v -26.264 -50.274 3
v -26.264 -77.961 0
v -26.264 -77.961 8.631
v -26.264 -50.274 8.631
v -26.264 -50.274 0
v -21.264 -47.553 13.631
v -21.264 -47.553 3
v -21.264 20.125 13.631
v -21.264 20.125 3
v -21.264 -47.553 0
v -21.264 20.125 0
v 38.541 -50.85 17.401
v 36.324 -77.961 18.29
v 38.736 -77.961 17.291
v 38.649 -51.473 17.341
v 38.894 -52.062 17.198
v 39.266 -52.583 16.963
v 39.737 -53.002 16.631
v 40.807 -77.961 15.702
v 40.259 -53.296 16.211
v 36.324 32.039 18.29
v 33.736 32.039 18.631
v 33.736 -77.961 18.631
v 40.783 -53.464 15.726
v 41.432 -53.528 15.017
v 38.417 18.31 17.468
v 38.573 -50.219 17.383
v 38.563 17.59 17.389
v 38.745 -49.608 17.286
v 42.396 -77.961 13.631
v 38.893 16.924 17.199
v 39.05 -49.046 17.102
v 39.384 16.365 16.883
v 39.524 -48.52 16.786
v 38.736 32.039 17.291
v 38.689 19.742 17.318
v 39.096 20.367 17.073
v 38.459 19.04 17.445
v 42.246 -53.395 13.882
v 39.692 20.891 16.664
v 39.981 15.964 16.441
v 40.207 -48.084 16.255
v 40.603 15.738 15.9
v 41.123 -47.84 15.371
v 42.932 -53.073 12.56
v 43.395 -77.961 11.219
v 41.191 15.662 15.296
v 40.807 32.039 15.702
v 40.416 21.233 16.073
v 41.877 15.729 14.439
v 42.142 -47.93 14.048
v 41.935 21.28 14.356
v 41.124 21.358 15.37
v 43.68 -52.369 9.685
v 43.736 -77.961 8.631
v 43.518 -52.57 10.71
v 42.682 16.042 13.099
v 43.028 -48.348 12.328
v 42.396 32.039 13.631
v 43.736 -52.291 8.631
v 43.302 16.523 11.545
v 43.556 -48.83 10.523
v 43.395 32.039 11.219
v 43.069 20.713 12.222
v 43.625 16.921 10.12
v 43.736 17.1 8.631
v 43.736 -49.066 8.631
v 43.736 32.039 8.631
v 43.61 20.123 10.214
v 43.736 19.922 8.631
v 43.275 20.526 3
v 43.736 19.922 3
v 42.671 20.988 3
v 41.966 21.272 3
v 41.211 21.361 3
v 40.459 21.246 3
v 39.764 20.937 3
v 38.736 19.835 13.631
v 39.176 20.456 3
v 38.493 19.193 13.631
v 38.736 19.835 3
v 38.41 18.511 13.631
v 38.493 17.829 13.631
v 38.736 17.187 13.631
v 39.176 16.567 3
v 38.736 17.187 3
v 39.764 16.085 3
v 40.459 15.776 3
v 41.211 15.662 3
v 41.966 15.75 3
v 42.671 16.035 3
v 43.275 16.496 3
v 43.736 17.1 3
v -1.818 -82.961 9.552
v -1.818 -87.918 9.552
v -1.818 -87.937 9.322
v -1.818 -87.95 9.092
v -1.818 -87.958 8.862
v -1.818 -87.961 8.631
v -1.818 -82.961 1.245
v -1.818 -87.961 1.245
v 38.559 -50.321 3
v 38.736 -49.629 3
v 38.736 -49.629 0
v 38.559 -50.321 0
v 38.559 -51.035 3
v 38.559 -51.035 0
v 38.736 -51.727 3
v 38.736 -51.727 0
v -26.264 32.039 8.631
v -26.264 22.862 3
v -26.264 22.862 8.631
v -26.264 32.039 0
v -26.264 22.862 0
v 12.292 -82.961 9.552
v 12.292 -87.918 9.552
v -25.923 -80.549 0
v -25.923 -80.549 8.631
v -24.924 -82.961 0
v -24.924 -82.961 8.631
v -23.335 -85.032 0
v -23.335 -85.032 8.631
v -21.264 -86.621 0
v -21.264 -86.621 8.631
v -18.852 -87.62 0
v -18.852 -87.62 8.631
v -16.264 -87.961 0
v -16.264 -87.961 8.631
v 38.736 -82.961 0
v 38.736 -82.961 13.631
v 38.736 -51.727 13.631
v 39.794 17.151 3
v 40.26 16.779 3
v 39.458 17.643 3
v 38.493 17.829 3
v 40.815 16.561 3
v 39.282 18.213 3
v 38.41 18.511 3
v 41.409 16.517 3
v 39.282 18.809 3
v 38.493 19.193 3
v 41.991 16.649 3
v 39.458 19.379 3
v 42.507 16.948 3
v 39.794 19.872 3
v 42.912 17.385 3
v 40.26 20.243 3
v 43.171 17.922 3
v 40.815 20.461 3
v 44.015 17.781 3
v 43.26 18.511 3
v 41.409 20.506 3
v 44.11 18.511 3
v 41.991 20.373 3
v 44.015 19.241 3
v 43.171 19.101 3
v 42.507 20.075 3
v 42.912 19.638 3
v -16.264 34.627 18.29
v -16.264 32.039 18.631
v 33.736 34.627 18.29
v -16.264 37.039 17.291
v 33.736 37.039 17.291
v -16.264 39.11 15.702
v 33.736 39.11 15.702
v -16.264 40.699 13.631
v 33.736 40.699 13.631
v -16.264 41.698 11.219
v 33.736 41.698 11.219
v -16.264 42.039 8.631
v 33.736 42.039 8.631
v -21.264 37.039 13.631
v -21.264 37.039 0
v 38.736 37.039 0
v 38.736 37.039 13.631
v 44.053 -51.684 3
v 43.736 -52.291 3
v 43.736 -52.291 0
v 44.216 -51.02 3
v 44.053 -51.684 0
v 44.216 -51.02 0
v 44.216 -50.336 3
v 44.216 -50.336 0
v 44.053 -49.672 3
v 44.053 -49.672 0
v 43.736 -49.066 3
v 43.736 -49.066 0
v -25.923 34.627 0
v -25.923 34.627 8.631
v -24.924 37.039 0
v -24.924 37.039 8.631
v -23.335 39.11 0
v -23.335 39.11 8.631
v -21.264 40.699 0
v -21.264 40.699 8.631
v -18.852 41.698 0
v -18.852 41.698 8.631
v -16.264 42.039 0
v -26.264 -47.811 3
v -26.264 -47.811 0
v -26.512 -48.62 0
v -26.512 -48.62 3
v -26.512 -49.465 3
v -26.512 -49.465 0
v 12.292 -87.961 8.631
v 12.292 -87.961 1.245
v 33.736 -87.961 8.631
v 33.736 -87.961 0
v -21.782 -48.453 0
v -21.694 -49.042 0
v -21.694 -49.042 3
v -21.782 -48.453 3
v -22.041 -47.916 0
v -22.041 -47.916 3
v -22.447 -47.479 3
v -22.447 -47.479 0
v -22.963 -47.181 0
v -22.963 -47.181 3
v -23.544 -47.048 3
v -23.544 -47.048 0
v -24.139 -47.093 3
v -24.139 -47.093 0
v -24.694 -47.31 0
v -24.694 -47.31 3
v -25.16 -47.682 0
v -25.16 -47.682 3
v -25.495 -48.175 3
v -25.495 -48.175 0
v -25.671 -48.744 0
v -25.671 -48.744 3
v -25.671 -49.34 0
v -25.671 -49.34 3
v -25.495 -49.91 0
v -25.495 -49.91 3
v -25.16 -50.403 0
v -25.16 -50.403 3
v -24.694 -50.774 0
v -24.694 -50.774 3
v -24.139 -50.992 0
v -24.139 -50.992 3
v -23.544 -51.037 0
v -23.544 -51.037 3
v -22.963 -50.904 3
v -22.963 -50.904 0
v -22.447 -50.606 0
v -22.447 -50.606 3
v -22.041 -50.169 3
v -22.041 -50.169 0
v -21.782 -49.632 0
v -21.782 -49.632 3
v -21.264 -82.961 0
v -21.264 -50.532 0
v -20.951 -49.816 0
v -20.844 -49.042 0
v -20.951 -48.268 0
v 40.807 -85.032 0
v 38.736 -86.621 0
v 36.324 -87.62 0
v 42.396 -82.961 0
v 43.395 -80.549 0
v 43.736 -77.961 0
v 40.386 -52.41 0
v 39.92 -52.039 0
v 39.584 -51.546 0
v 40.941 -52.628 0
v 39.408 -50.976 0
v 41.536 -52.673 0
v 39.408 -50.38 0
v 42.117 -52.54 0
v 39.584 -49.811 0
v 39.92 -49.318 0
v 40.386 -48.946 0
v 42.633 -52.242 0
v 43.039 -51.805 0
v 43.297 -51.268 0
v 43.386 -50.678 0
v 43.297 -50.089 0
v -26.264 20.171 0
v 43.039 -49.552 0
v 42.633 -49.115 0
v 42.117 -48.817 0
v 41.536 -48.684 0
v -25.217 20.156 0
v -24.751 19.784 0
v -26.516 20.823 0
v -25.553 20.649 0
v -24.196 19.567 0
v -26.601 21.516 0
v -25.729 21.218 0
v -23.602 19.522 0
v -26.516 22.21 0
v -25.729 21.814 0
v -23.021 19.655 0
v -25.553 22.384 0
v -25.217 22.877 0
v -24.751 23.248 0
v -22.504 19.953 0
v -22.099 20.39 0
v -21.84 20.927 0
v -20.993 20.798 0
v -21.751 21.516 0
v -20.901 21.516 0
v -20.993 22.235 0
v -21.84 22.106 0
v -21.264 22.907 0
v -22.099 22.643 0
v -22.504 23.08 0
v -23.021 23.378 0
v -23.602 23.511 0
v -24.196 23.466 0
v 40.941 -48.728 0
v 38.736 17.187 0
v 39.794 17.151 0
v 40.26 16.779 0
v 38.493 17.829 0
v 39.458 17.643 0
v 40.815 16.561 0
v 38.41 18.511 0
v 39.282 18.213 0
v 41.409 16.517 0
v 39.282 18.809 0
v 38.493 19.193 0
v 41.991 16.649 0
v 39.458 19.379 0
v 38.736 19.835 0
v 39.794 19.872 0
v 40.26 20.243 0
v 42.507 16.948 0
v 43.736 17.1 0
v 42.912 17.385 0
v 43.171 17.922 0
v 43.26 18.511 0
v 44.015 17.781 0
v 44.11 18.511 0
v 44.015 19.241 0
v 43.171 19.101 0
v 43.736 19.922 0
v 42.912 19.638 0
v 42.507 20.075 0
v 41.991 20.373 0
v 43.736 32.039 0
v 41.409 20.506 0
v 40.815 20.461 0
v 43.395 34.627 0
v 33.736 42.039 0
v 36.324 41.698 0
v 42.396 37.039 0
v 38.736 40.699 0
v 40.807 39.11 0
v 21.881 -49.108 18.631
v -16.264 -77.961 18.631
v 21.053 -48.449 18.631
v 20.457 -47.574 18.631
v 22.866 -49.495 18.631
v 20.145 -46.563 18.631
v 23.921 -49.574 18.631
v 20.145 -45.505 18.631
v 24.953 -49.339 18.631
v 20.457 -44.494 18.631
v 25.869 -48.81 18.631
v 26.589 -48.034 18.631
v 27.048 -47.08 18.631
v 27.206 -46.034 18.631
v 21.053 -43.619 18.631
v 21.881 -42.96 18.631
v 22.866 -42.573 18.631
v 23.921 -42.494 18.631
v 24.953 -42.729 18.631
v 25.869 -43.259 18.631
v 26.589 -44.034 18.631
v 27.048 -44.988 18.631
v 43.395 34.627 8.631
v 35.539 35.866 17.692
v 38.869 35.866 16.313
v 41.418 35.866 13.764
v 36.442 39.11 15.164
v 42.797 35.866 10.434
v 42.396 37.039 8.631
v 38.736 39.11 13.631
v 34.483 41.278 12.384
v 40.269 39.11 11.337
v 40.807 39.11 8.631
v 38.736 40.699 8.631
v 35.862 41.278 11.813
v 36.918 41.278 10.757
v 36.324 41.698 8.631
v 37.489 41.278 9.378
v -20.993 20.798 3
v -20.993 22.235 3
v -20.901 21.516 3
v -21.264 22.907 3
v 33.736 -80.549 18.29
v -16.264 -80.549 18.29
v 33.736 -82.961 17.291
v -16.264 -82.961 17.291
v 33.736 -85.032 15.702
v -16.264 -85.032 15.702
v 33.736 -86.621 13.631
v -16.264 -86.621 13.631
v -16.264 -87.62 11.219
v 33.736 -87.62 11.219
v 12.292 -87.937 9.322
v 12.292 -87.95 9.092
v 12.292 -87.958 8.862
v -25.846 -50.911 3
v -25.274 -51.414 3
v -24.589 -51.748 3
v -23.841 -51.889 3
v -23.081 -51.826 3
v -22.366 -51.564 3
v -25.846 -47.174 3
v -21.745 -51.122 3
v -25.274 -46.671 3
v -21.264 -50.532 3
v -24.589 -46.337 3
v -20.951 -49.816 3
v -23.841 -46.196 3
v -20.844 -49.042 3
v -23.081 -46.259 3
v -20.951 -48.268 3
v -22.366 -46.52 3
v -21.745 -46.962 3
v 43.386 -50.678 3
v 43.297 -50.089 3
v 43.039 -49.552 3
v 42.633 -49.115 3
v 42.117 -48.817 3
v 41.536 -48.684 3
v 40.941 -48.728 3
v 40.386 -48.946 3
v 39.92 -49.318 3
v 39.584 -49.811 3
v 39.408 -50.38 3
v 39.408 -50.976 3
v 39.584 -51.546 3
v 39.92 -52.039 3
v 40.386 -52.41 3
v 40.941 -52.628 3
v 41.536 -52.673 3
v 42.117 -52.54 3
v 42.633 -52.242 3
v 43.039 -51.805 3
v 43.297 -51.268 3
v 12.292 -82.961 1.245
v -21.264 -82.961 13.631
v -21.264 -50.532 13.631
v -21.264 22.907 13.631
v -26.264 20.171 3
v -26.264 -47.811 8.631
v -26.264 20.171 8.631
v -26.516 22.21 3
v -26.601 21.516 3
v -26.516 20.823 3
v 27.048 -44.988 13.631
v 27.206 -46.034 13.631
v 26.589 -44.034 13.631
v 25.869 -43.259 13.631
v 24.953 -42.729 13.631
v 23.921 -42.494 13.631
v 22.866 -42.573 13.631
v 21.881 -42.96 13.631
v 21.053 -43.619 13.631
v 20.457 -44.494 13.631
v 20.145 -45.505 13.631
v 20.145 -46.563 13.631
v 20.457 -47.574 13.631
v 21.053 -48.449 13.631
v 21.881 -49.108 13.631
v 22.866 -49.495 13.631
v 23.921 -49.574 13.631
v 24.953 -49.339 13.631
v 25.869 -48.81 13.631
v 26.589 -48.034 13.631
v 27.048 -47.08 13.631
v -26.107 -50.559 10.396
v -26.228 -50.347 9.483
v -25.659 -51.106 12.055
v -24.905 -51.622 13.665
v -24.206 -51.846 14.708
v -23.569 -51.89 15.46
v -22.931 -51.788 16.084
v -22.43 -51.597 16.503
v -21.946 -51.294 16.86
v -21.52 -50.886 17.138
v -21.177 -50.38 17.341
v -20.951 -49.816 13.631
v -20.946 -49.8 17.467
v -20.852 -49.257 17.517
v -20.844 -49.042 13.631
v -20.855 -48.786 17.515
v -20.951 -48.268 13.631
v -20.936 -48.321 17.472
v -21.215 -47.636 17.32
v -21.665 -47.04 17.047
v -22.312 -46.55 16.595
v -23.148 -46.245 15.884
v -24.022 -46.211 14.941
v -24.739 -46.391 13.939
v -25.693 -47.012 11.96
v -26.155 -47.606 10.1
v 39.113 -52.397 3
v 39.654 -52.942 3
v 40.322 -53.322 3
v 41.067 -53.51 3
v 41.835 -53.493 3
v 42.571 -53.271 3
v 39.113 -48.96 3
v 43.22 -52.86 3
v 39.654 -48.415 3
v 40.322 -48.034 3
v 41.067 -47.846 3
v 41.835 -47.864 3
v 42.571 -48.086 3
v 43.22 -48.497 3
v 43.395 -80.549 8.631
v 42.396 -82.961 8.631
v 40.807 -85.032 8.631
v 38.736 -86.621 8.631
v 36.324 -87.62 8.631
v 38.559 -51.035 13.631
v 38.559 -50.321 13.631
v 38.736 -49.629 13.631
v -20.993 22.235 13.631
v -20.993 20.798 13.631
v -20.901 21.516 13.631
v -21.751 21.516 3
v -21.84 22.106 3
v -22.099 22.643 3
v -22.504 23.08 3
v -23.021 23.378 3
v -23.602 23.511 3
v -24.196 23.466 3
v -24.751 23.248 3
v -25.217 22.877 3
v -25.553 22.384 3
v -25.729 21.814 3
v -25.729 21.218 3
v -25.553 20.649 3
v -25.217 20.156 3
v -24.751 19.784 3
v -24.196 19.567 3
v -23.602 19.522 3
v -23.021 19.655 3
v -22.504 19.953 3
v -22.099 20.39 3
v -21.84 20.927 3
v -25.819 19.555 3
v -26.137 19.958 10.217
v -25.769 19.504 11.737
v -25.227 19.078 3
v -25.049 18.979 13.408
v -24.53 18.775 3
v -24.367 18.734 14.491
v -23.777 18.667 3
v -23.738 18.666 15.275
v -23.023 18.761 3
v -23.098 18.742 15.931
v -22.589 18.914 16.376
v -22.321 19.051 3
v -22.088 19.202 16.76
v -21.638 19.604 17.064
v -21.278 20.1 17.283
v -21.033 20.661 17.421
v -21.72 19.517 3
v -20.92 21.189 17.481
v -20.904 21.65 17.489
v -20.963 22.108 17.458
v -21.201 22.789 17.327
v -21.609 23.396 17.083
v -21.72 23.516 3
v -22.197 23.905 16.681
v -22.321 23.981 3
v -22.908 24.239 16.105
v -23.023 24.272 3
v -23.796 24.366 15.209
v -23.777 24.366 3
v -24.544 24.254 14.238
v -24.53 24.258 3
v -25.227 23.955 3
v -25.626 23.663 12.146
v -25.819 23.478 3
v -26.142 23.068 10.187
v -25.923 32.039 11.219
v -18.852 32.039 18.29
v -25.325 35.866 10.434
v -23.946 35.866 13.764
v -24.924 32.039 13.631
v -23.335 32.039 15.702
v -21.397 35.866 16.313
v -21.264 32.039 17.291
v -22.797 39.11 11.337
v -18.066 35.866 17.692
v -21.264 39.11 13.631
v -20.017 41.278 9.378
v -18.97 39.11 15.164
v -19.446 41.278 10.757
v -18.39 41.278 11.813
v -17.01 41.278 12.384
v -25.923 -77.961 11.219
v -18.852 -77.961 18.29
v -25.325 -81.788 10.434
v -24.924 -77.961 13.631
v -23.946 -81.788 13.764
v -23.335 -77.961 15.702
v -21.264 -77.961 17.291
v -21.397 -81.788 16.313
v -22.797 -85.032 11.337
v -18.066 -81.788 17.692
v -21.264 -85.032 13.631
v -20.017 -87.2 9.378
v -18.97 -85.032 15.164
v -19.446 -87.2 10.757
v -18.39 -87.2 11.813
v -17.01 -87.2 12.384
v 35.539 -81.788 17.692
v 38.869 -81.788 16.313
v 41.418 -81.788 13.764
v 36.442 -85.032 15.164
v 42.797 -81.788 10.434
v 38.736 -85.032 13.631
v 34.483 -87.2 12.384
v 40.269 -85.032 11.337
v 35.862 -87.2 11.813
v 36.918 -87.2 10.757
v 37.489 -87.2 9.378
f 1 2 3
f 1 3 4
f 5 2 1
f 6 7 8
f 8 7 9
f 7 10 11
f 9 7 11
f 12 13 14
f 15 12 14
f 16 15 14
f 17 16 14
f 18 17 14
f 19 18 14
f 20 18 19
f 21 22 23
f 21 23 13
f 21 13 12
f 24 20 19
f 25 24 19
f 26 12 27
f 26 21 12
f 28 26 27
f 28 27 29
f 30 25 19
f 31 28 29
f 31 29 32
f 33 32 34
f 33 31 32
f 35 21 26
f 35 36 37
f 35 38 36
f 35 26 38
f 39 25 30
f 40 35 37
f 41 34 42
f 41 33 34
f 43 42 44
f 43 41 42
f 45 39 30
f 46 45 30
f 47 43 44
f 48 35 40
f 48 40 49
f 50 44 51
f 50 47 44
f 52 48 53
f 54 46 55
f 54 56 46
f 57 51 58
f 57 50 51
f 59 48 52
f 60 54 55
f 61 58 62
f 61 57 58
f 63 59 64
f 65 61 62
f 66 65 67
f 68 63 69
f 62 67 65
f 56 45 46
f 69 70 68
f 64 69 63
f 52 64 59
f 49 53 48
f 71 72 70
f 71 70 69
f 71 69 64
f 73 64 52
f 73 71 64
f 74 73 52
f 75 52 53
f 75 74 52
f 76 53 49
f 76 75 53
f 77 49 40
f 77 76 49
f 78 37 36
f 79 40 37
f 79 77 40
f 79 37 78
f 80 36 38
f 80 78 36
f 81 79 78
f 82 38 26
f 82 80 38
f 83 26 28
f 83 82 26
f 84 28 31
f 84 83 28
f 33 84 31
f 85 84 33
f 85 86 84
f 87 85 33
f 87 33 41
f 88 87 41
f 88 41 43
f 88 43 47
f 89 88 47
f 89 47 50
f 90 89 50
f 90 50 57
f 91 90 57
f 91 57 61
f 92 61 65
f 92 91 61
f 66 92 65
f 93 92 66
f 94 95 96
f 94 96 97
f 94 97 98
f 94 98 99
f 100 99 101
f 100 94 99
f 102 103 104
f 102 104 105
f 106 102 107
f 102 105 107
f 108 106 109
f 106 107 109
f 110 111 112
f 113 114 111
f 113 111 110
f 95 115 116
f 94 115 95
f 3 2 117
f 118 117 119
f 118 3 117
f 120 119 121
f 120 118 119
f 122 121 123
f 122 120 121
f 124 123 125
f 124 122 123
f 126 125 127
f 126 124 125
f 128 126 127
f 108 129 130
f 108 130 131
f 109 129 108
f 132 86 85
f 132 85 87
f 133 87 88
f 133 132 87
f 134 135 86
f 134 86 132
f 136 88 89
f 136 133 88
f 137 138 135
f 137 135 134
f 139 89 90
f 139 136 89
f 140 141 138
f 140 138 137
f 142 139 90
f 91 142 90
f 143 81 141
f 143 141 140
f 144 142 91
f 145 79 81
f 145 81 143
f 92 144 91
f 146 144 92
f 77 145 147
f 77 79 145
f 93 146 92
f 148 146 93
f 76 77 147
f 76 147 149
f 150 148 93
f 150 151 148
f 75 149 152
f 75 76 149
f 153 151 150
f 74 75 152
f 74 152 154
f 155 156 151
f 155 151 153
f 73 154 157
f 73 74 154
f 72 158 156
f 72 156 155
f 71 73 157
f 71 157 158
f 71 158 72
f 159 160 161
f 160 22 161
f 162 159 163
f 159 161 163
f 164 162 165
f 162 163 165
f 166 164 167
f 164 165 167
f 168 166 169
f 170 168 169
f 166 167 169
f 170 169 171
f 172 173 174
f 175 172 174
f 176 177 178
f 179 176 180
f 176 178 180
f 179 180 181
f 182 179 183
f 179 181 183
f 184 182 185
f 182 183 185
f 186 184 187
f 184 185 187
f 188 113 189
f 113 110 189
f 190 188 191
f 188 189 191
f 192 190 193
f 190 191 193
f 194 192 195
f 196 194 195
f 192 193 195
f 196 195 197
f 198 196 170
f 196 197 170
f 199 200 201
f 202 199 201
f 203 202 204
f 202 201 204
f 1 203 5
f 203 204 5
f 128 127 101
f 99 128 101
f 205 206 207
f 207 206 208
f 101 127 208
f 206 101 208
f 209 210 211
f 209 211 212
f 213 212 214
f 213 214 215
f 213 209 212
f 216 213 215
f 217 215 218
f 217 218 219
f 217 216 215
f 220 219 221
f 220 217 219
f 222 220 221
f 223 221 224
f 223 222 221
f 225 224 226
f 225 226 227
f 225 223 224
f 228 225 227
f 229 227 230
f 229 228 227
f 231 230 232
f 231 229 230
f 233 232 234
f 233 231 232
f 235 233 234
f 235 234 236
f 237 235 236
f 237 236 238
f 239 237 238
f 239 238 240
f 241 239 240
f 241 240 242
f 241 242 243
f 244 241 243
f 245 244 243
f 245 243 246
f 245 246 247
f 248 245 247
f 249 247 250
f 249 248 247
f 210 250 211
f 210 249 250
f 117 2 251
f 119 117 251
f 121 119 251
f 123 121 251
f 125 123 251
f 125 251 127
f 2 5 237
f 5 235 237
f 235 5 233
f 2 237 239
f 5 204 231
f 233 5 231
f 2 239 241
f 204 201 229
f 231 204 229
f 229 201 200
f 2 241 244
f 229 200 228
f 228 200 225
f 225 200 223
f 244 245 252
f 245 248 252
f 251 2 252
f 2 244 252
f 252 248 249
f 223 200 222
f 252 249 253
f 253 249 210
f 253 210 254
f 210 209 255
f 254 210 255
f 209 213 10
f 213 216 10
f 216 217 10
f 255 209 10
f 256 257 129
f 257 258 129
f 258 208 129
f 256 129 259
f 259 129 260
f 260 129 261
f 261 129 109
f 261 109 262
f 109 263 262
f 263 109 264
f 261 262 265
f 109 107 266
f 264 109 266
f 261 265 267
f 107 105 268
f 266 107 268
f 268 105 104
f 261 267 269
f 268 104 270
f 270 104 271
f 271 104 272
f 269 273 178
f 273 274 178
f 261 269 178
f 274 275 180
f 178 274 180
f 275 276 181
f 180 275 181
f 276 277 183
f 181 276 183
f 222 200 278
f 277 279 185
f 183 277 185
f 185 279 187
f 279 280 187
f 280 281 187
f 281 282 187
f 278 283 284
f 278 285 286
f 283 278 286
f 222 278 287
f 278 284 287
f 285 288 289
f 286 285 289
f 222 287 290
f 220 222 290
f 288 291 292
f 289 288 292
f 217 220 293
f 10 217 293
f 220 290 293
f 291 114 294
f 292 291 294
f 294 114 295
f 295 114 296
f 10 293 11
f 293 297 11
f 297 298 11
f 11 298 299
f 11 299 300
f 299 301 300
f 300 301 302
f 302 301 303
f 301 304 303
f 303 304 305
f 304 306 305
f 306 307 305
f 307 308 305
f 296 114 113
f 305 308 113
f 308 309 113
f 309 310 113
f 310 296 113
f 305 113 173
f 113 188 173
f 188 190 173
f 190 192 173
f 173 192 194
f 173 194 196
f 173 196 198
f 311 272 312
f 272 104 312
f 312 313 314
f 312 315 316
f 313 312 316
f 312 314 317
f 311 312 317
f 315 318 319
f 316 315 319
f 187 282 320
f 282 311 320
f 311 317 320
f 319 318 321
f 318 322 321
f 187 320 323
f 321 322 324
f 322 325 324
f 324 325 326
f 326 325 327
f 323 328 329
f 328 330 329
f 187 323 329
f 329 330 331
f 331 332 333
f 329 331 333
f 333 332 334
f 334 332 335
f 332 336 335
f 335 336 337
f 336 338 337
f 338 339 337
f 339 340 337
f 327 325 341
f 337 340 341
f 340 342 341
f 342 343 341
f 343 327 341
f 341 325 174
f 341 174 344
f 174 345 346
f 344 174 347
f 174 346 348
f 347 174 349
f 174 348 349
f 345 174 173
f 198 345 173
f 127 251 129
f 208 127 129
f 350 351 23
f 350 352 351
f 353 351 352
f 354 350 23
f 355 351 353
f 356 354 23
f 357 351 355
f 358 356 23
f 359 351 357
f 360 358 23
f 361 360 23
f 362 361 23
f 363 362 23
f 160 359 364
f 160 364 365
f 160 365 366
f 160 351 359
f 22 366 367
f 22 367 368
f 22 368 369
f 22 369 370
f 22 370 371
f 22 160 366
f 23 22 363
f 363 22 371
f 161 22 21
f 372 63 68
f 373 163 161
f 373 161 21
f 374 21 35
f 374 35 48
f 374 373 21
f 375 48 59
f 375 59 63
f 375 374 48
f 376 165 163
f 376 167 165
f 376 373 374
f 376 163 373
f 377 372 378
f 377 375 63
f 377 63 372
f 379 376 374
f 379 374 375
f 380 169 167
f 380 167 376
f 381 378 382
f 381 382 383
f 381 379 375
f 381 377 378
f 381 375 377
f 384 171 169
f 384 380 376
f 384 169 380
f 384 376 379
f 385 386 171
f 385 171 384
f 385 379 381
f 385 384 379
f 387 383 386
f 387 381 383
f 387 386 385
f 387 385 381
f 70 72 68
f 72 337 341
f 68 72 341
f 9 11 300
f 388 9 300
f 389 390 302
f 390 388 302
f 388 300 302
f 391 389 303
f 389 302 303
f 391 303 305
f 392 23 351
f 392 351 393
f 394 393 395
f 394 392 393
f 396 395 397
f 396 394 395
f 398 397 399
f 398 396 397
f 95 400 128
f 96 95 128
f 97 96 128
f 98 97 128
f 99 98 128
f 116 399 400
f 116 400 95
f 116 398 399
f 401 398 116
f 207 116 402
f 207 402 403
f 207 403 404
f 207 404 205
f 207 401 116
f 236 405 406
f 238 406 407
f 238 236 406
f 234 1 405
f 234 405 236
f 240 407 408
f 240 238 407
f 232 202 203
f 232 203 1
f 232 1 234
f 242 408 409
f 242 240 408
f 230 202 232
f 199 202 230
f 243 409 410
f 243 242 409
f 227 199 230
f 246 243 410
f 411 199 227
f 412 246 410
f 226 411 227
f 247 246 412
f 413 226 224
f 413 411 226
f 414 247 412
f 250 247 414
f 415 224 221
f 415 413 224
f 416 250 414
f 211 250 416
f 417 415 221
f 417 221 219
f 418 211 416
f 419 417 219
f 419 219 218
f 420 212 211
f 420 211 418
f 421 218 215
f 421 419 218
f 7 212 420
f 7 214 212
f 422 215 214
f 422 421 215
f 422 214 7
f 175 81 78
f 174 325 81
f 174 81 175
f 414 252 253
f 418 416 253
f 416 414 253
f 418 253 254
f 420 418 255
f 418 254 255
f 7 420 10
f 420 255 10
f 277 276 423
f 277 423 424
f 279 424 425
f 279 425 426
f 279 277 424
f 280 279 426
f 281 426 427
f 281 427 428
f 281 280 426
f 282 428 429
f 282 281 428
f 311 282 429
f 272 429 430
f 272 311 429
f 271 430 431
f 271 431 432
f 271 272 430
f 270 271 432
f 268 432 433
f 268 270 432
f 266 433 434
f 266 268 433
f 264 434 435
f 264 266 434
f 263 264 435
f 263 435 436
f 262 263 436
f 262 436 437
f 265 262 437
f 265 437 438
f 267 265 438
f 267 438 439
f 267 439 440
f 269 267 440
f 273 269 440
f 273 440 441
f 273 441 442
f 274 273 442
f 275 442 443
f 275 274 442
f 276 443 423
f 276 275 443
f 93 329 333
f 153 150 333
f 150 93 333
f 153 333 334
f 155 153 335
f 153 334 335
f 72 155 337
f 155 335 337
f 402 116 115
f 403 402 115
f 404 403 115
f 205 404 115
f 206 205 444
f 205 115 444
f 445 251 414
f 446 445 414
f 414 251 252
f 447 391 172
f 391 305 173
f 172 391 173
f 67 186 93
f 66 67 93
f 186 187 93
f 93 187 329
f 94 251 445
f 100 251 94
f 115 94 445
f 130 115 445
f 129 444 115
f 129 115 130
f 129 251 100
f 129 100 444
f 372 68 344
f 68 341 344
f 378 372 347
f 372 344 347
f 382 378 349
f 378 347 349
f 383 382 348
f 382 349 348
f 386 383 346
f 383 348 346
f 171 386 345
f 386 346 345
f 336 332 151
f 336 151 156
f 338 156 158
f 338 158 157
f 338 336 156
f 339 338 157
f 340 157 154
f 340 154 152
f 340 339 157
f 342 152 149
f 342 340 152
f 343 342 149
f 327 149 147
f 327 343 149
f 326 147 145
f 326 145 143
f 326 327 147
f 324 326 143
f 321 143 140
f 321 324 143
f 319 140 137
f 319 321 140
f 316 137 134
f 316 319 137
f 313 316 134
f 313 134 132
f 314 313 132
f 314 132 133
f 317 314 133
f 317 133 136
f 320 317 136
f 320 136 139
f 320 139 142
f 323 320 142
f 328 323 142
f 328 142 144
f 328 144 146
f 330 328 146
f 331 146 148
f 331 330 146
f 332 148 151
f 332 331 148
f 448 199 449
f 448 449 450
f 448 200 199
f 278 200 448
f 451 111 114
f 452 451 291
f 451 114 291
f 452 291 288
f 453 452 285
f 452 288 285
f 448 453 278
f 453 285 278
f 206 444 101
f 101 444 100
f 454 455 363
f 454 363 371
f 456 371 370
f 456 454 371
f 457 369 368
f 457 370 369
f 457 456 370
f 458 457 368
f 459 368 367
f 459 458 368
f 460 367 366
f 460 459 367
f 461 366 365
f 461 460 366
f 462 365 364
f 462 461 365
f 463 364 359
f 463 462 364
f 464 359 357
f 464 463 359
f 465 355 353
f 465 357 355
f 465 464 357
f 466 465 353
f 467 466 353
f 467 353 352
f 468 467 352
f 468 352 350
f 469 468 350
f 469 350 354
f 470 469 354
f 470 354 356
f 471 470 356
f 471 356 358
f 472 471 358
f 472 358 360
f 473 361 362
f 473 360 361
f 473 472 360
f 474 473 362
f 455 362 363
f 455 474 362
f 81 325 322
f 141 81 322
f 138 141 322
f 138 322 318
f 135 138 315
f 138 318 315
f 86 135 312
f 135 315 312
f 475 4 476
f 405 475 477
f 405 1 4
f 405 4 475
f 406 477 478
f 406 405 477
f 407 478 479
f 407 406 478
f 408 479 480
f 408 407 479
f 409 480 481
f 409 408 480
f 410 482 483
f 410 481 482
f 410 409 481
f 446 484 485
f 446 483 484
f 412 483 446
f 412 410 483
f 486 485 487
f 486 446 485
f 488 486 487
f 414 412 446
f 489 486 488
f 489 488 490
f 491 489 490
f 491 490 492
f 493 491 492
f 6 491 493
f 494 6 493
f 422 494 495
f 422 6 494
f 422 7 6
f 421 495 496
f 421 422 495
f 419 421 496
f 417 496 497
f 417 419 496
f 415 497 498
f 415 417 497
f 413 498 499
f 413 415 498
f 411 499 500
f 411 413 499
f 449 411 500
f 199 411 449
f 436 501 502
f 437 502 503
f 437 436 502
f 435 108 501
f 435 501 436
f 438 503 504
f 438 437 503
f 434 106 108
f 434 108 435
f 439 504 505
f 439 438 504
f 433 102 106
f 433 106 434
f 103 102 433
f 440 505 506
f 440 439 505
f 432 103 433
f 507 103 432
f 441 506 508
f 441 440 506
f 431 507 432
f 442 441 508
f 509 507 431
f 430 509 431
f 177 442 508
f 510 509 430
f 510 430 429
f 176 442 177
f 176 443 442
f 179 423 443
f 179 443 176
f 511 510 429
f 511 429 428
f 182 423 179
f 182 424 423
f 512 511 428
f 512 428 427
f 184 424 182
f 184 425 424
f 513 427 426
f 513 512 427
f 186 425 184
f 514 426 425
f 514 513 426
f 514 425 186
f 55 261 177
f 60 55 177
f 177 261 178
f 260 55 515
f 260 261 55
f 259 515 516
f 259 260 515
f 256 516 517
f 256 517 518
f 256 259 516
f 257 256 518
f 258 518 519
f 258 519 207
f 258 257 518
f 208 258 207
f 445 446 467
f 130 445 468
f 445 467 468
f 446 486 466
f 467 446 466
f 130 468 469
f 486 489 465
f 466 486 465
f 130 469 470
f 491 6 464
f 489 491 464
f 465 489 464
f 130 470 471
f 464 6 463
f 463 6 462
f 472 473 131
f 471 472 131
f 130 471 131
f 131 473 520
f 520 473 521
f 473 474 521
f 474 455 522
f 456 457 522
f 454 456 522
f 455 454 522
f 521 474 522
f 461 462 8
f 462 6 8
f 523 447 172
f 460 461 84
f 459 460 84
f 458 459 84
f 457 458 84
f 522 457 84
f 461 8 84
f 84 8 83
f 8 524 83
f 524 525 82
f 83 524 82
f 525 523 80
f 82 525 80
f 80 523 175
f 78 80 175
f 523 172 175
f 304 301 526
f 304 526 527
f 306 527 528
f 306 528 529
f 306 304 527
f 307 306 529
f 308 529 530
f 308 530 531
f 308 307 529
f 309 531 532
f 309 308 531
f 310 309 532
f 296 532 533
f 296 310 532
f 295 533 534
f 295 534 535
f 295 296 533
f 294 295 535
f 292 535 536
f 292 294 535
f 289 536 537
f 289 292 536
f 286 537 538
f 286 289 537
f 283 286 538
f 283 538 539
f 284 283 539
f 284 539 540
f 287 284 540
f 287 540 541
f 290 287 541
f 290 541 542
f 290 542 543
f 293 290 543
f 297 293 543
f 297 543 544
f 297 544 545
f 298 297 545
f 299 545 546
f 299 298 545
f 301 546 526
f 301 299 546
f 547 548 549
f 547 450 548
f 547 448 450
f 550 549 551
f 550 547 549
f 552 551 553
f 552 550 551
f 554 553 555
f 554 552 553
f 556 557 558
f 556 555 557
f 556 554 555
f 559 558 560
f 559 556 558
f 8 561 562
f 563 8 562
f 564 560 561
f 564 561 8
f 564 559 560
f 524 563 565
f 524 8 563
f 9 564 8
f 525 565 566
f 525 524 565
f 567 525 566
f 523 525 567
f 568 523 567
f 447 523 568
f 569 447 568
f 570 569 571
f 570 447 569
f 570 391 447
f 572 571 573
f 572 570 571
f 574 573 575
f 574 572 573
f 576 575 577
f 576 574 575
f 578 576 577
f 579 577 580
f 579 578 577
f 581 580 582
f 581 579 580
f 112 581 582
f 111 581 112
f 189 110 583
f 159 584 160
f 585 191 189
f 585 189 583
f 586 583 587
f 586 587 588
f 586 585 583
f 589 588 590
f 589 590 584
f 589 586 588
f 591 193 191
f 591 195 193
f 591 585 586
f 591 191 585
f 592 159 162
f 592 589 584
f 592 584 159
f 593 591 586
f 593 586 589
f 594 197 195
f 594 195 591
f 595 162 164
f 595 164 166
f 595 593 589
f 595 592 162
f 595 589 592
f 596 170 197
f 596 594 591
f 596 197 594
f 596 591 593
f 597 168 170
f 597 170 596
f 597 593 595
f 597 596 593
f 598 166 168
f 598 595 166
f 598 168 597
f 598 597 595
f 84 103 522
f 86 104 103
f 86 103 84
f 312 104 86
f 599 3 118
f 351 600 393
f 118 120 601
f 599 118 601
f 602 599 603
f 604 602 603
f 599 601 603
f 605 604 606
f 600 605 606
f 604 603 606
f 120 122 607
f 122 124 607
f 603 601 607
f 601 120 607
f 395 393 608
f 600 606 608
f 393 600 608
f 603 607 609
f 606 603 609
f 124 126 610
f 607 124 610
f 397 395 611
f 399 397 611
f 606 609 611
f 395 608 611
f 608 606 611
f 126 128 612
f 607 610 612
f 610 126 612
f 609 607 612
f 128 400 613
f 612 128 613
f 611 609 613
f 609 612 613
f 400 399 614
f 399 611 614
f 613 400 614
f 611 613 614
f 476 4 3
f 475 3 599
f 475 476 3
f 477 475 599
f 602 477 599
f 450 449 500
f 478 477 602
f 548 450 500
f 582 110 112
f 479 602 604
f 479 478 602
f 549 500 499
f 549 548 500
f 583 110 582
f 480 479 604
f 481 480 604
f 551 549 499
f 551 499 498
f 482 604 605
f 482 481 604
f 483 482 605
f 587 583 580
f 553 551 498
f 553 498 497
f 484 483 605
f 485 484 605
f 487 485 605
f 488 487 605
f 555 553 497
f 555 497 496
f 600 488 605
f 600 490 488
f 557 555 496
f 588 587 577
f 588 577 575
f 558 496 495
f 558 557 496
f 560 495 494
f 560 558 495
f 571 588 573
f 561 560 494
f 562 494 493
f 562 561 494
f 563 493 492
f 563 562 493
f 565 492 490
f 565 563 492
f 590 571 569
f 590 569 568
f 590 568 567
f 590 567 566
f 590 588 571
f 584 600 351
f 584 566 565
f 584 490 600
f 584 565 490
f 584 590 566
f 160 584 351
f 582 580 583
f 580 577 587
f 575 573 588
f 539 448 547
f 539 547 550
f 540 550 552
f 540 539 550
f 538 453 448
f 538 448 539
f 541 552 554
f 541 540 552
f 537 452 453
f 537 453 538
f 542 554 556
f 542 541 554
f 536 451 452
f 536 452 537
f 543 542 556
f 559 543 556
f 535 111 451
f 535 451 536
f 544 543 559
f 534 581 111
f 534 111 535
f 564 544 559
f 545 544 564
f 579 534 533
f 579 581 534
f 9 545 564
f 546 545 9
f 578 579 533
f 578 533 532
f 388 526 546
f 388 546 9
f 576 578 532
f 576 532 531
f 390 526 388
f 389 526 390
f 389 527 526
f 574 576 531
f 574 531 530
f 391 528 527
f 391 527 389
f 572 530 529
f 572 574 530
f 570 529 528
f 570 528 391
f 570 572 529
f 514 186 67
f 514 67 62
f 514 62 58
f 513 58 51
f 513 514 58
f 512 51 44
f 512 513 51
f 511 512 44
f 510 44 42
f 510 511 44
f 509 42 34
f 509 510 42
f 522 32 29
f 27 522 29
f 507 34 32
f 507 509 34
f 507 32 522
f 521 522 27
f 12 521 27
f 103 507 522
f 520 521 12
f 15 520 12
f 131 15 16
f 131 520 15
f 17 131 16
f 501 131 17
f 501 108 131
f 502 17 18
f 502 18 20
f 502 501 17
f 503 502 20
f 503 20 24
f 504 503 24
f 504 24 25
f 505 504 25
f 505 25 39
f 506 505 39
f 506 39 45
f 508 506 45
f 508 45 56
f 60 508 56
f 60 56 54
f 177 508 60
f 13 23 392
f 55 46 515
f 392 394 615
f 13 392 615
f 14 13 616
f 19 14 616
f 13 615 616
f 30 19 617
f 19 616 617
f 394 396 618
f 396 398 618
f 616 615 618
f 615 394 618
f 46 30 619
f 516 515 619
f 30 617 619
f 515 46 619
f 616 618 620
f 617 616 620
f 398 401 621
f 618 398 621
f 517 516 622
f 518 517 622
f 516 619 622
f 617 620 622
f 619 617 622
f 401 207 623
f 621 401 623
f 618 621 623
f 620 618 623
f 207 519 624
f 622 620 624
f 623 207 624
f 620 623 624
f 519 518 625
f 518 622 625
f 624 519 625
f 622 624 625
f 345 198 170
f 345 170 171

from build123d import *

# Parameters (mm, degrees)
SKETCH1_W           = 70
SKETCH1_H           = 130
BOSS_EXTRUDE1_DEPTH = 18.631112222
SHELL1_T            = -5
FILLET1_R           = 10
FILLET2_R           = 10
FILLET4_R           = 10
FILLET6_R           = 10
SKETCH2_R           = 3.55
CUT_EXTRUDE1_DEPTH  = 26
SKETCH3_W           = 14.110384164
SKETCH3_H           = 8.306919709
CUT_EXTRUDE4_DEPTH  = 30
SKETCH4_R           = 2.85
CUT_EXTRUDE5_DEPTH  = 24
SKETCH5_R           = 2.85
SKETCH5_R_2         = 2
BOSS_EXTRUDE2_DEPTH = 3


with BuildPart() as part:
    # Sketch1 → Boss-Extrude1 (new body)
    with BuildSketch(Plane.XY):
        with Locations((8.736165571, -22.960828507)):
            Rectangle(SKETCH1_W, SKETCH1_H)
    extrude(amount=BOSS_EXTRUDE1_DEPTH)

    # Shell1
    shell1_openings = [part.faces().sort_by_distance(p)[0] for p in [
        (8.736165571, -22.960828507, 0),
    ]]
    offset(amount=SHELL1_T, openings=shell1_openings, kind=Kind.INTERSECTION)

    # Fillet1
    fillet1_edges = [part.edges().sort_by_distance(p)[0] for p in [
        (-26.263834429, -22.960828507, 18.631112222),
    ]]
    fillet(fillet1_edges, radius=FILLET1_R)

    # Fillet2
    fillet2_edges = [part.edges().sort_by_distance(p)[0] for p in [
        (43.736165571, -22.960828507, 18.631112222),
    ]]
    fillet(fillet2_edges, radius=FILLET2_R)

    # Fillet4
    fillet4_edges = [part.edges().sort_by_distance(p)[0] for p in [
        (-26.263834429, 42.039171493, 4.315556111),
        (-23.334902241, 42.039171493, 15.702180034),
        (8.736165571, 42.039171493, 18.631112222),
        (43.736165571, 42.039171493, 4.315556111),
        (40.807233383, 42.039171493, 15.702180034),
    ]]
    fillet(fillet4_edges, radius=FILLET4_R)

    # Fillet6
    fillet6_edges = [part.edges().sort_by_distance(p)[0] for p in [
        (8.736165571, -87.960828507, 18.631112222),
        (-26.263834429, -87.960828507, 4.315556111),
        (-23.334902241, -87.960828507, 15.702180034),
        (43.736165571, -87.960828507, 4.315556111),
        (40.807233383, -87.960828507, 15.702180034),
    ]]
    fillet(fillet6_edges, radius=FILLET6_R)

    # Sketch2 → Cut-Extrude1 (cut)
    with BuildSketch(Plane.XY.offset(7.783233926)):
        with Locations((23.655578881, -46.034025118)):
            Circle(SKETCH2_R)
    extrude(amount=CUT_EXTRUDE1_DEPTH, mode=Mode.SUBTRACT)

    # Sketch3 → Cut-Extrude4 (cut)
    with BuildSketch(Plane(origin=(1.2837e-05, -73.41928233, 3.209e-06), x_dir=(-1, -1.75e-07, 0), z_dir=(1.75e-07, -1, 4.4e-08))):
        with Locations((-5.237013871, -5.398091498)):
            Rectangle(SKETCH3_W, SKETCH3_H)
    extrude(amount=CUT_EXTRUDE4_DEPTH, mode=Mode.SUBTRACT)

    # Sketch4 → Cut-Extrude5 (cut)
    with BuildSketch(Plane.XY):
        with Locations((41.386116272, -50.678340094)):
            Circle(SKETCH4_R)
        with Locations((41.259820466, 18.511183857)):
            Circle(SKETCH4_R)
        with Locations((-23.693524603, -49.042382464)):
            Circle(SKETCH4_R)
        with Locations((-23.751261028, 21.516382028)):
            Circle(SKETCH4_R)
    extrude(amount=CUT_EXTRUDE5_DEPTH, mode=Mode.SUBTRACT)

    # Sketch5 → Boss-Extrude2 (add)
    with BuildSketch(Plane.XY):
        with Locations((-23.751261028, 21.516382028)):
            Circle(SKETCH5_R)
        with Locations((-23.751261028, 21.516382028)):
            Circle(SKETCH5_R_2, mode=Mode.SUBTRACT)
        with Locations((41.259820466, 18.511183857)):
            Circle(SKETCH5_R)
        with Locations((41.259820466, 18.511183857)):
            Circle(SKETCH5_R_2, mode=Mode.SUBTRACT)
        with Locations((41.386116272, -50.678340094)):
            Circle(SKETCH5_R)
        with Locations((41.386116272, -50.678340094)):
            Circle(SKETCH5_R_2, mode=Mode.SUBTRACT)
        with Locations((-23.693524603, -49.042382464)):
            Circle(SKETCH5_R)
        with Locations((-23.693524603, -49.042382464)):
            Circle(SKETCH5_R_2, mode=Mode.SUBTRACT)
    extrude(amount=BOSS_EXTRUDE2_DEPTH)


solid = part.part
